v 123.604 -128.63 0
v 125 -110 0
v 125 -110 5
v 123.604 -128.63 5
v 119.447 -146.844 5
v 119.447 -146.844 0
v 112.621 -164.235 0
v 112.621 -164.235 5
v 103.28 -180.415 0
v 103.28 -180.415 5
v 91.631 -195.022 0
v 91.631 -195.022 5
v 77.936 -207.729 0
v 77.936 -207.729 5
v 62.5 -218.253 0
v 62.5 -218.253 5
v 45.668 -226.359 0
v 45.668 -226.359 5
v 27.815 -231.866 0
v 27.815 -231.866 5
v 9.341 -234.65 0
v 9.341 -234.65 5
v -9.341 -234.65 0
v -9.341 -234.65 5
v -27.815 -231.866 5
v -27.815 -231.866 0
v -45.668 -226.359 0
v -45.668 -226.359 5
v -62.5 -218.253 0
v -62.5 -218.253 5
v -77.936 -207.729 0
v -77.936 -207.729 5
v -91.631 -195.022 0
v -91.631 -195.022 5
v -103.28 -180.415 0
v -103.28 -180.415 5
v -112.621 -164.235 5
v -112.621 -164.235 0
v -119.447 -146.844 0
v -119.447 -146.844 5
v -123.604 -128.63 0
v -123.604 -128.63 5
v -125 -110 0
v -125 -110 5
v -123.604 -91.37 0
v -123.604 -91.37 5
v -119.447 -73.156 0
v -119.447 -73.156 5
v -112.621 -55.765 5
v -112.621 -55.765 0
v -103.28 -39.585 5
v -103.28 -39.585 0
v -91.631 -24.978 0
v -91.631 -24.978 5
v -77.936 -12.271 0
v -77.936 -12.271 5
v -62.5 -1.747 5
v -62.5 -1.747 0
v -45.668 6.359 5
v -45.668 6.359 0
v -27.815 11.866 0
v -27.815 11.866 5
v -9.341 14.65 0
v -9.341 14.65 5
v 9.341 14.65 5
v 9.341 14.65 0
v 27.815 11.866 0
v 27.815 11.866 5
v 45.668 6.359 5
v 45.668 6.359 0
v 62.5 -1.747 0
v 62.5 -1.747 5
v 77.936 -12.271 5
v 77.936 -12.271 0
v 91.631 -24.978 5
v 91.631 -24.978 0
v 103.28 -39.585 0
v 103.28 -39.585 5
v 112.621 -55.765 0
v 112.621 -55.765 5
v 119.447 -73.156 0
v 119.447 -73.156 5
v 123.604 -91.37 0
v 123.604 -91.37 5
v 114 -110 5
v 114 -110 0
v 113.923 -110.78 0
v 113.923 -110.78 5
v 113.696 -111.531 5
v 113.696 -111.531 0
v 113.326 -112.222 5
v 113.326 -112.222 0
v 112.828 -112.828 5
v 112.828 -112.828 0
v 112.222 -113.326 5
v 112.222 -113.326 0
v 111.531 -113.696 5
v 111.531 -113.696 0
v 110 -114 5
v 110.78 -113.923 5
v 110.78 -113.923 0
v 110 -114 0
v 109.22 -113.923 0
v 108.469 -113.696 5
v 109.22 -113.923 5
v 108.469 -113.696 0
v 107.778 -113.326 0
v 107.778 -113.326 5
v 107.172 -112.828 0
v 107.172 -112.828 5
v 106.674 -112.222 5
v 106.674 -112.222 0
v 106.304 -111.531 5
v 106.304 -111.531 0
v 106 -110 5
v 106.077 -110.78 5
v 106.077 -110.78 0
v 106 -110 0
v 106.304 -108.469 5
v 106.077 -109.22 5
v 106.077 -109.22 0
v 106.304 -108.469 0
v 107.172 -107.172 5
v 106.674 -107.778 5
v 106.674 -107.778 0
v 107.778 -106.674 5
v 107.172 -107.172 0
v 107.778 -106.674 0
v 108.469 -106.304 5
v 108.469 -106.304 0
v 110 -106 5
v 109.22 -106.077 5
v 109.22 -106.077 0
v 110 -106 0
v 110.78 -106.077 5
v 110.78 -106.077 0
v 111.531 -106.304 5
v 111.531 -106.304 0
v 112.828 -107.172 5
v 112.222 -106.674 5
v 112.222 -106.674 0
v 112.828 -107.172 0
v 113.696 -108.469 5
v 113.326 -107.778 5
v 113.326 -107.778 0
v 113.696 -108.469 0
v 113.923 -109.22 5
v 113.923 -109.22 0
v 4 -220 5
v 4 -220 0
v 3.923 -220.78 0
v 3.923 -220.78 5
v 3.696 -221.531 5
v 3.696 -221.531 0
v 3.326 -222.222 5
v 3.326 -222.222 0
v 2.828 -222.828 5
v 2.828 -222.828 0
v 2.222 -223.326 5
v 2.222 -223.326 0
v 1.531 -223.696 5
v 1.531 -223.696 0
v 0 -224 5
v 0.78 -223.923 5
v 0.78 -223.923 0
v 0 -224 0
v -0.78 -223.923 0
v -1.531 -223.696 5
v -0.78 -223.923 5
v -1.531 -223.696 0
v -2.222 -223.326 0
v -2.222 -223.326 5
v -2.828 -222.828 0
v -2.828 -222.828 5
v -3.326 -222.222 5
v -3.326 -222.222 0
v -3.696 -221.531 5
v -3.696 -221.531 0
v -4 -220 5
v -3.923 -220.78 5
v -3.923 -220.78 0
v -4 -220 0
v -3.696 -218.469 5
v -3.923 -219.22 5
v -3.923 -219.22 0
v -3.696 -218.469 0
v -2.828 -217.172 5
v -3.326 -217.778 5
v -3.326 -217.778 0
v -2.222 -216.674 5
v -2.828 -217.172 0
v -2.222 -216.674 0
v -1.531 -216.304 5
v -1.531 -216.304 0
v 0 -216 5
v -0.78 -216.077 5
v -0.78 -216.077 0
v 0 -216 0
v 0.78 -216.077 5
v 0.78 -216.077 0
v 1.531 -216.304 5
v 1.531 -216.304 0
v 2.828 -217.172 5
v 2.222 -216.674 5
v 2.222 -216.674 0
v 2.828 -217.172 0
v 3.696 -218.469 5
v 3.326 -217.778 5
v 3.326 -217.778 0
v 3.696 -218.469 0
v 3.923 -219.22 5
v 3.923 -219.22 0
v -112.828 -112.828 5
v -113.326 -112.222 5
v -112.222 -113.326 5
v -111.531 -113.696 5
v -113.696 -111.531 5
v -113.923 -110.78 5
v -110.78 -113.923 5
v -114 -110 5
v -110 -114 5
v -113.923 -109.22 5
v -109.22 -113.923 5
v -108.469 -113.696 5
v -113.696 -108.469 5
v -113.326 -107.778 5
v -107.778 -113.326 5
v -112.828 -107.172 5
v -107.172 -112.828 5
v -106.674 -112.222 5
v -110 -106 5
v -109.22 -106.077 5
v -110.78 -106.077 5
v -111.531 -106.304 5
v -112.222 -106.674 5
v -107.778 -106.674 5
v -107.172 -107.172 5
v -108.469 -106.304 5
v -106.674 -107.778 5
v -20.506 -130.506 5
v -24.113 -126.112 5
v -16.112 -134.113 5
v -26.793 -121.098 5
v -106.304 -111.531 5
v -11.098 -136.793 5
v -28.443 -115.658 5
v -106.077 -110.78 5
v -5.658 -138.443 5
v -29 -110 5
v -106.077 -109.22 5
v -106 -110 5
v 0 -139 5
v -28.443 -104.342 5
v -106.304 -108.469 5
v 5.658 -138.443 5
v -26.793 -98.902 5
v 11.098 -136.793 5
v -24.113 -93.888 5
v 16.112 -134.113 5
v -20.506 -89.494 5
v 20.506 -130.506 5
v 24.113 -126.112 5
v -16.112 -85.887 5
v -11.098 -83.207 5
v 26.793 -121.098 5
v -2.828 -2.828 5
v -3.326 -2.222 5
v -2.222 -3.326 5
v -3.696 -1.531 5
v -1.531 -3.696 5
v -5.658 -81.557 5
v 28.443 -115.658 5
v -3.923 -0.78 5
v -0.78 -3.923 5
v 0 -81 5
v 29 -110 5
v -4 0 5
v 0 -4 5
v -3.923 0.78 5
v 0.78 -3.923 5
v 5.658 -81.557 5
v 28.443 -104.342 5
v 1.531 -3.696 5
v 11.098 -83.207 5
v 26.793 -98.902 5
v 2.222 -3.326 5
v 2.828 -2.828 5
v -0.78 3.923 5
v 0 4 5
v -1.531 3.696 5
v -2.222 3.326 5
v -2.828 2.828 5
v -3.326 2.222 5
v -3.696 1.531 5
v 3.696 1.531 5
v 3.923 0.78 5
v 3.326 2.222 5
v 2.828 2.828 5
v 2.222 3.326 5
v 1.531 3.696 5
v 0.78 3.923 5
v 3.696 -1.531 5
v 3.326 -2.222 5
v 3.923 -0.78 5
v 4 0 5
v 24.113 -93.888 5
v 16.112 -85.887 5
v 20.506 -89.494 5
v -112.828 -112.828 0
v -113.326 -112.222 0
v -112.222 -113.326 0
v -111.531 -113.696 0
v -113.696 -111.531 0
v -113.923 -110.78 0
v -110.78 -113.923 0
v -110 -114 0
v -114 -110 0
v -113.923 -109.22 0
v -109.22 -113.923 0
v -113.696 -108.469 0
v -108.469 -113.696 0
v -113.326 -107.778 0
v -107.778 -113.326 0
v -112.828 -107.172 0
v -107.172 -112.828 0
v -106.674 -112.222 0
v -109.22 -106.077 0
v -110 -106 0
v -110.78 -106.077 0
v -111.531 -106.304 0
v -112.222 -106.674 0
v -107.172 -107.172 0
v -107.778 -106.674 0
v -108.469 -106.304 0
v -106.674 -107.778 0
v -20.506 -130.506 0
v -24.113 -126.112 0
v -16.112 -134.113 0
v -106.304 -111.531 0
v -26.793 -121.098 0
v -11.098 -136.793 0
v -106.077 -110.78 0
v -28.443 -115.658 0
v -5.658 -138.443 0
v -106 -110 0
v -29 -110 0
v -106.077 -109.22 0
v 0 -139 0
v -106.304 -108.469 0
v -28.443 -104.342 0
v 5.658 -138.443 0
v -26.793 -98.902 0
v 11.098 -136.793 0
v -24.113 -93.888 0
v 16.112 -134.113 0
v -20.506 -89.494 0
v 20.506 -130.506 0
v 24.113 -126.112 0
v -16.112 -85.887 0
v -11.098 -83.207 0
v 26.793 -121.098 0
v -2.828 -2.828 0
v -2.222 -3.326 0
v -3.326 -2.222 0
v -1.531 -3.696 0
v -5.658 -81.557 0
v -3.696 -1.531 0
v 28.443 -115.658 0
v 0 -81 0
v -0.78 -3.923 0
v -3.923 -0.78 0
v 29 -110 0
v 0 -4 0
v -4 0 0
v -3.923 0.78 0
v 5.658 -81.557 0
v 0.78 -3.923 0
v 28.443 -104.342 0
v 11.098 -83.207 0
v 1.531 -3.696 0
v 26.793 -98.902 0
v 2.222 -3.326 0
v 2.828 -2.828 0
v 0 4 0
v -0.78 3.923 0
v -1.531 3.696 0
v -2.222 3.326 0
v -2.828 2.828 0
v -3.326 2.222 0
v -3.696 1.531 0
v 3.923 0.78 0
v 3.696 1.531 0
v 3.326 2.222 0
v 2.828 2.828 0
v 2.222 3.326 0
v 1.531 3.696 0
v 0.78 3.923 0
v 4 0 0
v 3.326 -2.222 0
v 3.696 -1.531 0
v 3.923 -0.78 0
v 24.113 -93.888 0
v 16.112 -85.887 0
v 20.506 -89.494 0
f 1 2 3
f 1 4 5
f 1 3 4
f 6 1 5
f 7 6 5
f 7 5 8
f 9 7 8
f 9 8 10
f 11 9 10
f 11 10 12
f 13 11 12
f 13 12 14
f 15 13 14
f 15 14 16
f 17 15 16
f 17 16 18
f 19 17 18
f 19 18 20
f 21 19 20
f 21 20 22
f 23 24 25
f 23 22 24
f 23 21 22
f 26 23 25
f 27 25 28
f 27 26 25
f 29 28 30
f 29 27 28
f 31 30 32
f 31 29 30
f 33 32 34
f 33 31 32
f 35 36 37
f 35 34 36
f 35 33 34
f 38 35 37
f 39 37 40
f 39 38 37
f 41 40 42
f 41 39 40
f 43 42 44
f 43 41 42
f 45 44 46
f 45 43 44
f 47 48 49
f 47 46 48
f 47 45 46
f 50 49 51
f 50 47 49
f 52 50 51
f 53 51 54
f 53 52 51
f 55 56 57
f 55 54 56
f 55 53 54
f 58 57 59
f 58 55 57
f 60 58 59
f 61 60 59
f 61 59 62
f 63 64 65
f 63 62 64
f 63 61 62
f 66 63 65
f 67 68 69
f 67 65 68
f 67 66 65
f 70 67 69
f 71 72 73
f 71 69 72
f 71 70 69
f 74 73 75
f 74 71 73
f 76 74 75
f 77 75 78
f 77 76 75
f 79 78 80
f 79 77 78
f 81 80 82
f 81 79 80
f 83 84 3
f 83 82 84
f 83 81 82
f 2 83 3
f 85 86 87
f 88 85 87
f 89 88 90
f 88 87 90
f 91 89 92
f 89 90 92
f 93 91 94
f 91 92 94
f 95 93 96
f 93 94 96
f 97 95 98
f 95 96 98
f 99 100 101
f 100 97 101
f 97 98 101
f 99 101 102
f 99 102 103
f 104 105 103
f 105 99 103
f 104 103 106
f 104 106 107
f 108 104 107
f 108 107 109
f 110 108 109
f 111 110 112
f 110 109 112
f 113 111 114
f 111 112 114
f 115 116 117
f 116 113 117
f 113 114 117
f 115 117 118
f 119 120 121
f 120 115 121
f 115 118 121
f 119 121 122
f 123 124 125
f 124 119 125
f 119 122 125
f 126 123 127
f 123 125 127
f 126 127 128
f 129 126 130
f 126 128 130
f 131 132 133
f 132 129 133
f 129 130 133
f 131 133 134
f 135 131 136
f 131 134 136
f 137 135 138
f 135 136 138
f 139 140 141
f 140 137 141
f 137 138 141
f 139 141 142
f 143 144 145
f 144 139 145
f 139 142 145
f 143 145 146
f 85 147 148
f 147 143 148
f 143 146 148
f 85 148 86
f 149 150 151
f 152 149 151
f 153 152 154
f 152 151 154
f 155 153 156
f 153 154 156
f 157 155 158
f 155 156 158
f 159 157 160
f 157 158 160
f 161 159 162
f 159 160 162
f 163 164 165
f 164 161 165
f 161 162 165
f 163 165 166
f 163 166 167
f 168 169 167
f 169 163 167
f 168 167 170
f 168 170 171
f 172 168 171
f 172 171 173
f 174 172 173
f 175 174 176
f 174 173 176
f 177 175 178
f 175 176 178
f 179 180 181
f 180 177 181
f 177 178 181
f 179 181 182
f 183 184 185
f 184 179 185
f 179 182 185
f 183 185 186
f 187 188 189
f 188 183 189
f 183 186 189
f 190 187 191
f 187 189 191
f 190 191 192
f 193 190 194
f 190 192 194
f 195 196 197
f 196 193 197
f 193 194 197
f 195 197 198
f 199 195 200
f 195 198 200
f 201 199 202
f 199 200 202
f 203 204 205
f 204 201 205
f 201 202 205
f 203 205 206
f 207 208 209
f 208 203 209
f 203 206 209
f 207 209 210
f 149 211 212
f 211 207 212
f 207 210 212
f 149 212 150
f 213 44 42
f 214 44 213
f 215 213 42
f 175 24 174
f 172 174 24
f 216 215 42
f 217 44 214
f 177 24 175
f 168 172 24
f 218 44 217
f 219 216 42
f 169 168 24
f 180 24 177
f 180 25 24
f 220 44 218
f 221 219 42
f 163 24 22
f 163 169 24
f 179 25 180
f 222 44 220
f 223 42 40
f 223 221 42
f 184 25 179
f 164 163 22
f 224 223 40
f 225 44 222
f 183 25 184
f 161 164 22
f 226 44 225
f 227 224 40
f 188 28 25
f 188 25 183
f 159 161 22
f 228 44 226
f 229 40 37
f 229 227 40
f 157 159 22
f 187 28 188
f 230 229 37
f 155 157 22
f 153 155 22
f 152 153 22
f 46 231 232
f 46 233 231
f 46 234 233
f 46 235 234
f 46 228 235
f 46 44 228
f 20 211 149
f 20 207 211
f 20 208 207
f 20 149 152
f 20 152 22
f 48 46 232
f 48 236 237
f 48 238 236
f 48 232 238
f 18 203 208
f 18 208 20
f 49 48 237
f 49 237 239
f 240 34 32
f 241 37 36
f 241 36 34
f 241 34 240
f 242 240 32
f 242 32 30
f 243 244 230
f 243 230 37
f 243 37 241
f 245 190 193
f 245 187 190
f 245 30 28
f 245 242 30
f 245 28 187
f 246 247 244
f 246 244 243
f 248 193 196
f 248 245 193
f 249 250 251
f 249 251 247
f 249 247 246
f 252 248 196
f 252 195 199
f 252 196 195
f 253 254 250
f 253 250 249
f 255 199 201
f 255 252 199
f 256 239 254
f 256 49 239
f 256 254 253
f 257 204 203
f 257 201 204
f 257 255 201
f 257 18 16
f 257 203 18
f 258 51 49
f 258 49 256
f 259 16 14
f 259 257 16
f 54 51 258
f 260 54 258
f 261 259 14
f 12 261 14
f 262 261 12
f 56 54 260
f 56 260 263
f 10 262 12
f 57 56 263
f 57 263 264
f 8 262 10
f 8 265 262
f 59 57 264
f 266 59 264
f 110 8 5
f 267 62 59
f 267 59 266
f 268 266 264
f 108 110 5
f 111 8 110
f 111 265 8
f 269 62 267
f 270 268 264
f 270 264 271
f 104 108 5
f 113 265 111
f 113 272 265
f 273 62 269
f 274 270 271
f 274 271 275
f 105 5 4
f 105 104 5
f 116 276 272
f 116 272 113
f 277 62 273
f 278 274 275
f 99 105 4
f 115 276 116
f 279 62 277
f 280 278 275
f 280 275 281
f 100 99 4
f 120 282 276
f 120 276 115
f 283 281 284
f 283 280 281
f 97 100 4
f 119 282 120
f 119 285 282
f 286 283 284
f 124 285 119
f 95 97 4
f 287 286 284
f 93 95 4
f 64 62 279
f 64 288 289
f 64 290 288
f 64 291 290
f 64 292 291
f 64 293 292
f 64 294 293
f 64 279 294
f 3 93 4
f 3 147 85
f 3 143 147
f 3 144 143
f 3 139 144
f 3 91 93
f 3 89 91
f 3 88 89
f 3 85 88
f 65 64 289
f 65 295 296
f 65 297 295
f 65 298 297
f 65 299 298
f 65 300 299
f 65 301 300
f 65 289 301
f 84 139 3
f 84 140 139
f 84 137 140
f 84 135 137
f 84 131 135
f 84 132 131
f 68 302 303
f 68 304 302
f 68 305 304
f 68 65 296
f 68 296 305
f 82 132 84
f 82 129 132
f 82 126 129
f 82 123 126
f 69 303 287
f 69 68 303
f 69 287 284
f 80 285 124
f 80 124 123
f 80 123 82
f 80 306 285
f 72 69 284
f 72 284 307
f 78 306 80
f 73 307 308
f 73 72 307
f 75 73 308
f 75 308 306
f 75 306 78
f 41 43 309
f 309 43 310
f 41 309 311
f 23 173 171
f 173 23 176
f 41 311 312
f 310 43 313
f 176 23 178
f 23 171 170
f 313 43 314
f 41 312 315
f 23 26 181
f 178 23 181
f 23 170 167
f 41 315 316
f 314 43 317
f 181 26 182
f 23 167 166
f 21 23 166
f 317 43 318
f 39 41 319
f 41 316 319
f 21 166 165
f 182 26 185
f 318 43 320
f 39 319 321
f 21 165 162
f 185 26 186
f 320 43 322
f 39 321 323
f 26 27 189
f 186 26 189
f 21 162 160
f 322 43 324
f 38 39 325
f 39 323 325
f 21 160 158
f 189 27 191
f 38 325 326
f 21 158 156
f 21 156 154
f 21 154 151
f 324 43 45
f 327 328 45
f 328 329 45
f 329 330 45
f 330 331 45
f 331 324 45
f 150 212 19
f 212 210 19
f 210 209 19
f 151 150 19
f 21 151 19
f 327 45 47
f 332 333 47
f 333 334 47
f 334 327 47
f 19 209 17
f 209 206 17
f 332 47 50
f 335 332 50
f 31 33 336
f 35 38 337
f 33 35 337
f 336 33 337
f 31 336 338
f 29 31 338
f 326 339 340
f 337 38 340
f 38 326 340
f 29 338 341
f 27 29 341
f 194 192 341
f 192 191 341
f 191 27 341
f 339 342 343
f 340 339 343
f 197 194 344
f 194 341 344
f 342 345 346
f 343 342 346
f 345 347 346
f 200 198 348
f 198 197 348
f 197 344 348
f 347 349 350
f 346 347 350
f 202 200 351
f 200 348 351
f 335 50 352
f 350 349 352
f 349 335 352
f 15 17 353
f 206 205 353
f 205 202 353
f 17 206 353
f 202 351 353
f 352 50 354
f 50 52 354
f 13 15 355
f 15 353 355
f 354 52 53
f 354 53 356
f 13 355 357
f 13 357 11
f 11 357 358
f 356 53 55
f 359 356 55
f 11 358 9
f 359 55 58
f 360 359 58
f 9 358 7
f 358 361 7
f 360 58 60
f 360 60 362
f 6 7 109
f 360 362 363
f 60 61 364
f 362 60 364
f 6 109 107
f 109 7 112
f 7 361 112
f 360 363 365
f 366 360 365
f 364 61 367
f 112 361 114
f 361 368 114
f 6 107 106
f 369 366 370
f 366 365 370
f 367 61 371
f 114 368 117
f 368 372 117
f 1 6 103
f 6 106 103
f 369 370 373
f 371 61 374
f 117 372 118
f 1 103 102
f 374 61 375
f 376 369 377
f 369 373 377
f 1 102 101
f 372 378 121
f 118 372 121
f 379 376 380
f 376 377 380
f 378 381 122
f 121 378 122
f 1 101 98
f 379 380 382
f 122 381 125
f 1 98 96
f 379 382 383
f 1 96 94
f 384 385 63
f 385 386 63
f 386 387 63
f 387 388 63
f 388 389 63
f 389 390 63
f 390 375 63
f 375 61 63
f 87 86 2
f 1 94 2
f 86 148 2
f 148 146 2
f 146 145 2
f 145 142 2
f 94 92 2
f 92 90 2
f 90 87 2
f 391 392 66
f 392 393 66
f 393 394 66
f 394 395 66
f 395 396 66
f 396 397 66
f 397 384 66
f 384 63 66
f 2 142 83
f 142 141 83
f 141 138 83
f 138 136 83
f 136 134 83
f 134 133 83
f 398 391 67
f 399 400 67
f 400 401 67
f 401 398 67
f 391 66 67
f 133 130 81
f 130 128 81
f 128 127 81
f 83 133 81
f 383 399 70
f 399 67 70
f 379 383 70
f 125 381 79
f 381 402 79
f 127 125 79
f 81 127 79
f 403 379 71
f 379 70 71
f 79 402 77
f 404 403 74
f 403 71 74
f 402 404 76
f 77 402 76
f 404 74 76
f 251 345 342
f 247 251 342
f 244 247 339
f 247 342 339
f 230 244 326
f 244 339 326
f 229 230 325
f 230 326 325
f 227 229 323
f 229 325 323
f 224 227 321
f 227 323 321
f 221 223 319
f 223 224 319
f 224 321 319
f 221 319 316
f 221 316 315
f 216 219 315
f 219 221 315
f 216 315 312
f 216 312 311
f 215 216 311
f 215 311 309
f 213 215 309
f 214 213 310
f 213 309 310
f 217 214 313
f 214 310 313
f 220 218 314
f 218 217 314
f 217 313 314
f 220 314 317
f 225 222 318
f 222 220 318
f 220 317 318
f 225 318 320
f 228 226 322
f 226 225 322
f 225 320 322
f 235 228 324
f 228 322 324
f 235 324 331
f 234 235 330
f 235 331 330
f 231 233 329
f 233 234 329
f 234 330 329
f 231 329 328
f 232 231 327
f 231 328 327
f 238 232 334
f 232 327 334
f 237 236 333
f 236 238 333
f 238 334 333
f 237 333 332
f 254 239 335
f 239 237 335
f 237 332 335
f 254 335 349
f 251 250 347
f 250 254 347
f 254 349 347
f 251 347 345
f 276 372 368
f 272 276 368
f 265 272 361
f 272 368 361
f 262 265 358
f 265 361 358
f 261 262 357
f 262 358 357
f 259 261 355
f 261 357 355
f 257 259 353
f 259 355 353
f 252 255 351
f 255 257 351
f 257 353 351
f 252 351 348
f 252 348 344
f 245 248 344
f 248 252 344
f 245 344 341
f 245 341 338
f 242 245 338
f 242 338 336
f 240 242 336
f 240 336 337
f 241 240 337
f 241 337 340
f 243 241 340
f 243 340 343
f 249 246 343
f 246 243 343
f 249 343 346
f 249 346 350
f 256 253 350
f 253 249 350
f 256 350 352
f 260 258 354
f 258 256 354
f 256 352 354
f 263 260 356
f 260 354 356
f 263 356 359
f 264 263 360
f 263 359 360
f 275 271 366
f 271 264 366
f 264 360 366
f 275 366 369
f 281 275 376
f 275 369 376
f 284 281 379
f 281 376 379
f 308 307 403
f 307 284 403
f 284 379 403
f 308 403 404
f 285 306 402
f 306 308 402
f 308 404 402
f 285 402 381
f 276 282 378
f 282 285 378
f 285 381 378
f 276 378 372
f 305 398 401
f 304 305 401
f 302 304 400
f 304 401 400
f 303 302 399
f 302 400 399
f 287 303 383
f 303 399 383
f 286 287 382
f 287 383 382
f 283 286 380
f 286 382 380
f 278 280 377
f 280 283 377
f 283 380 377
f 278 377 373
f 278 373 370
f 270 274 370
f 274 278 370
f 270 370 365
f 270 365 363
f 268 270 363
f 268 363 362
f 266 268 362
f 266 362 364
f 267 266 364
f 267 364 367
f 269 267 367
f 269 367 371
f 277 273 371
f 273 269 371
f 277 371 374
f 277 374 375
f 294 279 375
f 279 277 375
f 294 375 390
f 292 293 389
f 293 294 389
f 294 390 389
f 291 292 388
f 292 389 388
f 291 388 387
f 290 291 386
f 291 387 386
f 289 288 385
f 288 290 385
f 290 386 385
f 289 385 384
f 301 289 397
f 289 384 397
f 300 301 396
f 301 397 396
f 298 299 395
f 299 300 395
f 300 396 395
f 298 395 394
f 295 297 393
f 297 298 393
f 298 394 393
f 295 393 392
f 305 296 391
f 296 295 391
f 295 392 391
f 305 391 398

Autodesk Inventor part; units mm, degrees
ref_plane "YZ Plane" through (0, 0, 0) normal (1, 0, 0) x (0, 1, 0)
ref_plane "XZ Plane" through (0, 0, 0) normal (0, 1, 0) x (-1, 0, 0)
ref_plane "XY Plane" through (0, 0, 0) normal (0, 0, 1) x (1, 0, 0)
sketch "Sketch1" plane through (0, 0, 0) normal (0, 0, 1) x (1, 0, 0)
  circle A0 centre (0, -110) radius 125 projected
  circle A1 centre (0, -220) radius 4 projected
  circle A2 centre (110, -110) radius 4 projected
  circle A3 centre (-110, -110) radius 4 projected
  circle A4 centre (0, 0) radius 4 projected
  circle A5 centre (0, -110) radius 125 projected
  circle A6 centre (-7.5, -97.0096) radius 2 construction
  circle A7 centre (-15, -110) radius 2 construction
  circle A8 centre (-7.5, -122.9904) radius 2 construction
  circle A9 centre (7.5, -122.9904) radius 2 construction
  circle A10 centre (15, -110) radius 2 construction
  circle A11 centre (7.5, -97.0096) radius 2 construction
  circle A12 centre (0, -110) radius 29
  dimension "d0" = 58
extrude "Extrusion1" add sketch "Sketch1" along normal blind 5
properties part number "second copper plate" material "Copper"
